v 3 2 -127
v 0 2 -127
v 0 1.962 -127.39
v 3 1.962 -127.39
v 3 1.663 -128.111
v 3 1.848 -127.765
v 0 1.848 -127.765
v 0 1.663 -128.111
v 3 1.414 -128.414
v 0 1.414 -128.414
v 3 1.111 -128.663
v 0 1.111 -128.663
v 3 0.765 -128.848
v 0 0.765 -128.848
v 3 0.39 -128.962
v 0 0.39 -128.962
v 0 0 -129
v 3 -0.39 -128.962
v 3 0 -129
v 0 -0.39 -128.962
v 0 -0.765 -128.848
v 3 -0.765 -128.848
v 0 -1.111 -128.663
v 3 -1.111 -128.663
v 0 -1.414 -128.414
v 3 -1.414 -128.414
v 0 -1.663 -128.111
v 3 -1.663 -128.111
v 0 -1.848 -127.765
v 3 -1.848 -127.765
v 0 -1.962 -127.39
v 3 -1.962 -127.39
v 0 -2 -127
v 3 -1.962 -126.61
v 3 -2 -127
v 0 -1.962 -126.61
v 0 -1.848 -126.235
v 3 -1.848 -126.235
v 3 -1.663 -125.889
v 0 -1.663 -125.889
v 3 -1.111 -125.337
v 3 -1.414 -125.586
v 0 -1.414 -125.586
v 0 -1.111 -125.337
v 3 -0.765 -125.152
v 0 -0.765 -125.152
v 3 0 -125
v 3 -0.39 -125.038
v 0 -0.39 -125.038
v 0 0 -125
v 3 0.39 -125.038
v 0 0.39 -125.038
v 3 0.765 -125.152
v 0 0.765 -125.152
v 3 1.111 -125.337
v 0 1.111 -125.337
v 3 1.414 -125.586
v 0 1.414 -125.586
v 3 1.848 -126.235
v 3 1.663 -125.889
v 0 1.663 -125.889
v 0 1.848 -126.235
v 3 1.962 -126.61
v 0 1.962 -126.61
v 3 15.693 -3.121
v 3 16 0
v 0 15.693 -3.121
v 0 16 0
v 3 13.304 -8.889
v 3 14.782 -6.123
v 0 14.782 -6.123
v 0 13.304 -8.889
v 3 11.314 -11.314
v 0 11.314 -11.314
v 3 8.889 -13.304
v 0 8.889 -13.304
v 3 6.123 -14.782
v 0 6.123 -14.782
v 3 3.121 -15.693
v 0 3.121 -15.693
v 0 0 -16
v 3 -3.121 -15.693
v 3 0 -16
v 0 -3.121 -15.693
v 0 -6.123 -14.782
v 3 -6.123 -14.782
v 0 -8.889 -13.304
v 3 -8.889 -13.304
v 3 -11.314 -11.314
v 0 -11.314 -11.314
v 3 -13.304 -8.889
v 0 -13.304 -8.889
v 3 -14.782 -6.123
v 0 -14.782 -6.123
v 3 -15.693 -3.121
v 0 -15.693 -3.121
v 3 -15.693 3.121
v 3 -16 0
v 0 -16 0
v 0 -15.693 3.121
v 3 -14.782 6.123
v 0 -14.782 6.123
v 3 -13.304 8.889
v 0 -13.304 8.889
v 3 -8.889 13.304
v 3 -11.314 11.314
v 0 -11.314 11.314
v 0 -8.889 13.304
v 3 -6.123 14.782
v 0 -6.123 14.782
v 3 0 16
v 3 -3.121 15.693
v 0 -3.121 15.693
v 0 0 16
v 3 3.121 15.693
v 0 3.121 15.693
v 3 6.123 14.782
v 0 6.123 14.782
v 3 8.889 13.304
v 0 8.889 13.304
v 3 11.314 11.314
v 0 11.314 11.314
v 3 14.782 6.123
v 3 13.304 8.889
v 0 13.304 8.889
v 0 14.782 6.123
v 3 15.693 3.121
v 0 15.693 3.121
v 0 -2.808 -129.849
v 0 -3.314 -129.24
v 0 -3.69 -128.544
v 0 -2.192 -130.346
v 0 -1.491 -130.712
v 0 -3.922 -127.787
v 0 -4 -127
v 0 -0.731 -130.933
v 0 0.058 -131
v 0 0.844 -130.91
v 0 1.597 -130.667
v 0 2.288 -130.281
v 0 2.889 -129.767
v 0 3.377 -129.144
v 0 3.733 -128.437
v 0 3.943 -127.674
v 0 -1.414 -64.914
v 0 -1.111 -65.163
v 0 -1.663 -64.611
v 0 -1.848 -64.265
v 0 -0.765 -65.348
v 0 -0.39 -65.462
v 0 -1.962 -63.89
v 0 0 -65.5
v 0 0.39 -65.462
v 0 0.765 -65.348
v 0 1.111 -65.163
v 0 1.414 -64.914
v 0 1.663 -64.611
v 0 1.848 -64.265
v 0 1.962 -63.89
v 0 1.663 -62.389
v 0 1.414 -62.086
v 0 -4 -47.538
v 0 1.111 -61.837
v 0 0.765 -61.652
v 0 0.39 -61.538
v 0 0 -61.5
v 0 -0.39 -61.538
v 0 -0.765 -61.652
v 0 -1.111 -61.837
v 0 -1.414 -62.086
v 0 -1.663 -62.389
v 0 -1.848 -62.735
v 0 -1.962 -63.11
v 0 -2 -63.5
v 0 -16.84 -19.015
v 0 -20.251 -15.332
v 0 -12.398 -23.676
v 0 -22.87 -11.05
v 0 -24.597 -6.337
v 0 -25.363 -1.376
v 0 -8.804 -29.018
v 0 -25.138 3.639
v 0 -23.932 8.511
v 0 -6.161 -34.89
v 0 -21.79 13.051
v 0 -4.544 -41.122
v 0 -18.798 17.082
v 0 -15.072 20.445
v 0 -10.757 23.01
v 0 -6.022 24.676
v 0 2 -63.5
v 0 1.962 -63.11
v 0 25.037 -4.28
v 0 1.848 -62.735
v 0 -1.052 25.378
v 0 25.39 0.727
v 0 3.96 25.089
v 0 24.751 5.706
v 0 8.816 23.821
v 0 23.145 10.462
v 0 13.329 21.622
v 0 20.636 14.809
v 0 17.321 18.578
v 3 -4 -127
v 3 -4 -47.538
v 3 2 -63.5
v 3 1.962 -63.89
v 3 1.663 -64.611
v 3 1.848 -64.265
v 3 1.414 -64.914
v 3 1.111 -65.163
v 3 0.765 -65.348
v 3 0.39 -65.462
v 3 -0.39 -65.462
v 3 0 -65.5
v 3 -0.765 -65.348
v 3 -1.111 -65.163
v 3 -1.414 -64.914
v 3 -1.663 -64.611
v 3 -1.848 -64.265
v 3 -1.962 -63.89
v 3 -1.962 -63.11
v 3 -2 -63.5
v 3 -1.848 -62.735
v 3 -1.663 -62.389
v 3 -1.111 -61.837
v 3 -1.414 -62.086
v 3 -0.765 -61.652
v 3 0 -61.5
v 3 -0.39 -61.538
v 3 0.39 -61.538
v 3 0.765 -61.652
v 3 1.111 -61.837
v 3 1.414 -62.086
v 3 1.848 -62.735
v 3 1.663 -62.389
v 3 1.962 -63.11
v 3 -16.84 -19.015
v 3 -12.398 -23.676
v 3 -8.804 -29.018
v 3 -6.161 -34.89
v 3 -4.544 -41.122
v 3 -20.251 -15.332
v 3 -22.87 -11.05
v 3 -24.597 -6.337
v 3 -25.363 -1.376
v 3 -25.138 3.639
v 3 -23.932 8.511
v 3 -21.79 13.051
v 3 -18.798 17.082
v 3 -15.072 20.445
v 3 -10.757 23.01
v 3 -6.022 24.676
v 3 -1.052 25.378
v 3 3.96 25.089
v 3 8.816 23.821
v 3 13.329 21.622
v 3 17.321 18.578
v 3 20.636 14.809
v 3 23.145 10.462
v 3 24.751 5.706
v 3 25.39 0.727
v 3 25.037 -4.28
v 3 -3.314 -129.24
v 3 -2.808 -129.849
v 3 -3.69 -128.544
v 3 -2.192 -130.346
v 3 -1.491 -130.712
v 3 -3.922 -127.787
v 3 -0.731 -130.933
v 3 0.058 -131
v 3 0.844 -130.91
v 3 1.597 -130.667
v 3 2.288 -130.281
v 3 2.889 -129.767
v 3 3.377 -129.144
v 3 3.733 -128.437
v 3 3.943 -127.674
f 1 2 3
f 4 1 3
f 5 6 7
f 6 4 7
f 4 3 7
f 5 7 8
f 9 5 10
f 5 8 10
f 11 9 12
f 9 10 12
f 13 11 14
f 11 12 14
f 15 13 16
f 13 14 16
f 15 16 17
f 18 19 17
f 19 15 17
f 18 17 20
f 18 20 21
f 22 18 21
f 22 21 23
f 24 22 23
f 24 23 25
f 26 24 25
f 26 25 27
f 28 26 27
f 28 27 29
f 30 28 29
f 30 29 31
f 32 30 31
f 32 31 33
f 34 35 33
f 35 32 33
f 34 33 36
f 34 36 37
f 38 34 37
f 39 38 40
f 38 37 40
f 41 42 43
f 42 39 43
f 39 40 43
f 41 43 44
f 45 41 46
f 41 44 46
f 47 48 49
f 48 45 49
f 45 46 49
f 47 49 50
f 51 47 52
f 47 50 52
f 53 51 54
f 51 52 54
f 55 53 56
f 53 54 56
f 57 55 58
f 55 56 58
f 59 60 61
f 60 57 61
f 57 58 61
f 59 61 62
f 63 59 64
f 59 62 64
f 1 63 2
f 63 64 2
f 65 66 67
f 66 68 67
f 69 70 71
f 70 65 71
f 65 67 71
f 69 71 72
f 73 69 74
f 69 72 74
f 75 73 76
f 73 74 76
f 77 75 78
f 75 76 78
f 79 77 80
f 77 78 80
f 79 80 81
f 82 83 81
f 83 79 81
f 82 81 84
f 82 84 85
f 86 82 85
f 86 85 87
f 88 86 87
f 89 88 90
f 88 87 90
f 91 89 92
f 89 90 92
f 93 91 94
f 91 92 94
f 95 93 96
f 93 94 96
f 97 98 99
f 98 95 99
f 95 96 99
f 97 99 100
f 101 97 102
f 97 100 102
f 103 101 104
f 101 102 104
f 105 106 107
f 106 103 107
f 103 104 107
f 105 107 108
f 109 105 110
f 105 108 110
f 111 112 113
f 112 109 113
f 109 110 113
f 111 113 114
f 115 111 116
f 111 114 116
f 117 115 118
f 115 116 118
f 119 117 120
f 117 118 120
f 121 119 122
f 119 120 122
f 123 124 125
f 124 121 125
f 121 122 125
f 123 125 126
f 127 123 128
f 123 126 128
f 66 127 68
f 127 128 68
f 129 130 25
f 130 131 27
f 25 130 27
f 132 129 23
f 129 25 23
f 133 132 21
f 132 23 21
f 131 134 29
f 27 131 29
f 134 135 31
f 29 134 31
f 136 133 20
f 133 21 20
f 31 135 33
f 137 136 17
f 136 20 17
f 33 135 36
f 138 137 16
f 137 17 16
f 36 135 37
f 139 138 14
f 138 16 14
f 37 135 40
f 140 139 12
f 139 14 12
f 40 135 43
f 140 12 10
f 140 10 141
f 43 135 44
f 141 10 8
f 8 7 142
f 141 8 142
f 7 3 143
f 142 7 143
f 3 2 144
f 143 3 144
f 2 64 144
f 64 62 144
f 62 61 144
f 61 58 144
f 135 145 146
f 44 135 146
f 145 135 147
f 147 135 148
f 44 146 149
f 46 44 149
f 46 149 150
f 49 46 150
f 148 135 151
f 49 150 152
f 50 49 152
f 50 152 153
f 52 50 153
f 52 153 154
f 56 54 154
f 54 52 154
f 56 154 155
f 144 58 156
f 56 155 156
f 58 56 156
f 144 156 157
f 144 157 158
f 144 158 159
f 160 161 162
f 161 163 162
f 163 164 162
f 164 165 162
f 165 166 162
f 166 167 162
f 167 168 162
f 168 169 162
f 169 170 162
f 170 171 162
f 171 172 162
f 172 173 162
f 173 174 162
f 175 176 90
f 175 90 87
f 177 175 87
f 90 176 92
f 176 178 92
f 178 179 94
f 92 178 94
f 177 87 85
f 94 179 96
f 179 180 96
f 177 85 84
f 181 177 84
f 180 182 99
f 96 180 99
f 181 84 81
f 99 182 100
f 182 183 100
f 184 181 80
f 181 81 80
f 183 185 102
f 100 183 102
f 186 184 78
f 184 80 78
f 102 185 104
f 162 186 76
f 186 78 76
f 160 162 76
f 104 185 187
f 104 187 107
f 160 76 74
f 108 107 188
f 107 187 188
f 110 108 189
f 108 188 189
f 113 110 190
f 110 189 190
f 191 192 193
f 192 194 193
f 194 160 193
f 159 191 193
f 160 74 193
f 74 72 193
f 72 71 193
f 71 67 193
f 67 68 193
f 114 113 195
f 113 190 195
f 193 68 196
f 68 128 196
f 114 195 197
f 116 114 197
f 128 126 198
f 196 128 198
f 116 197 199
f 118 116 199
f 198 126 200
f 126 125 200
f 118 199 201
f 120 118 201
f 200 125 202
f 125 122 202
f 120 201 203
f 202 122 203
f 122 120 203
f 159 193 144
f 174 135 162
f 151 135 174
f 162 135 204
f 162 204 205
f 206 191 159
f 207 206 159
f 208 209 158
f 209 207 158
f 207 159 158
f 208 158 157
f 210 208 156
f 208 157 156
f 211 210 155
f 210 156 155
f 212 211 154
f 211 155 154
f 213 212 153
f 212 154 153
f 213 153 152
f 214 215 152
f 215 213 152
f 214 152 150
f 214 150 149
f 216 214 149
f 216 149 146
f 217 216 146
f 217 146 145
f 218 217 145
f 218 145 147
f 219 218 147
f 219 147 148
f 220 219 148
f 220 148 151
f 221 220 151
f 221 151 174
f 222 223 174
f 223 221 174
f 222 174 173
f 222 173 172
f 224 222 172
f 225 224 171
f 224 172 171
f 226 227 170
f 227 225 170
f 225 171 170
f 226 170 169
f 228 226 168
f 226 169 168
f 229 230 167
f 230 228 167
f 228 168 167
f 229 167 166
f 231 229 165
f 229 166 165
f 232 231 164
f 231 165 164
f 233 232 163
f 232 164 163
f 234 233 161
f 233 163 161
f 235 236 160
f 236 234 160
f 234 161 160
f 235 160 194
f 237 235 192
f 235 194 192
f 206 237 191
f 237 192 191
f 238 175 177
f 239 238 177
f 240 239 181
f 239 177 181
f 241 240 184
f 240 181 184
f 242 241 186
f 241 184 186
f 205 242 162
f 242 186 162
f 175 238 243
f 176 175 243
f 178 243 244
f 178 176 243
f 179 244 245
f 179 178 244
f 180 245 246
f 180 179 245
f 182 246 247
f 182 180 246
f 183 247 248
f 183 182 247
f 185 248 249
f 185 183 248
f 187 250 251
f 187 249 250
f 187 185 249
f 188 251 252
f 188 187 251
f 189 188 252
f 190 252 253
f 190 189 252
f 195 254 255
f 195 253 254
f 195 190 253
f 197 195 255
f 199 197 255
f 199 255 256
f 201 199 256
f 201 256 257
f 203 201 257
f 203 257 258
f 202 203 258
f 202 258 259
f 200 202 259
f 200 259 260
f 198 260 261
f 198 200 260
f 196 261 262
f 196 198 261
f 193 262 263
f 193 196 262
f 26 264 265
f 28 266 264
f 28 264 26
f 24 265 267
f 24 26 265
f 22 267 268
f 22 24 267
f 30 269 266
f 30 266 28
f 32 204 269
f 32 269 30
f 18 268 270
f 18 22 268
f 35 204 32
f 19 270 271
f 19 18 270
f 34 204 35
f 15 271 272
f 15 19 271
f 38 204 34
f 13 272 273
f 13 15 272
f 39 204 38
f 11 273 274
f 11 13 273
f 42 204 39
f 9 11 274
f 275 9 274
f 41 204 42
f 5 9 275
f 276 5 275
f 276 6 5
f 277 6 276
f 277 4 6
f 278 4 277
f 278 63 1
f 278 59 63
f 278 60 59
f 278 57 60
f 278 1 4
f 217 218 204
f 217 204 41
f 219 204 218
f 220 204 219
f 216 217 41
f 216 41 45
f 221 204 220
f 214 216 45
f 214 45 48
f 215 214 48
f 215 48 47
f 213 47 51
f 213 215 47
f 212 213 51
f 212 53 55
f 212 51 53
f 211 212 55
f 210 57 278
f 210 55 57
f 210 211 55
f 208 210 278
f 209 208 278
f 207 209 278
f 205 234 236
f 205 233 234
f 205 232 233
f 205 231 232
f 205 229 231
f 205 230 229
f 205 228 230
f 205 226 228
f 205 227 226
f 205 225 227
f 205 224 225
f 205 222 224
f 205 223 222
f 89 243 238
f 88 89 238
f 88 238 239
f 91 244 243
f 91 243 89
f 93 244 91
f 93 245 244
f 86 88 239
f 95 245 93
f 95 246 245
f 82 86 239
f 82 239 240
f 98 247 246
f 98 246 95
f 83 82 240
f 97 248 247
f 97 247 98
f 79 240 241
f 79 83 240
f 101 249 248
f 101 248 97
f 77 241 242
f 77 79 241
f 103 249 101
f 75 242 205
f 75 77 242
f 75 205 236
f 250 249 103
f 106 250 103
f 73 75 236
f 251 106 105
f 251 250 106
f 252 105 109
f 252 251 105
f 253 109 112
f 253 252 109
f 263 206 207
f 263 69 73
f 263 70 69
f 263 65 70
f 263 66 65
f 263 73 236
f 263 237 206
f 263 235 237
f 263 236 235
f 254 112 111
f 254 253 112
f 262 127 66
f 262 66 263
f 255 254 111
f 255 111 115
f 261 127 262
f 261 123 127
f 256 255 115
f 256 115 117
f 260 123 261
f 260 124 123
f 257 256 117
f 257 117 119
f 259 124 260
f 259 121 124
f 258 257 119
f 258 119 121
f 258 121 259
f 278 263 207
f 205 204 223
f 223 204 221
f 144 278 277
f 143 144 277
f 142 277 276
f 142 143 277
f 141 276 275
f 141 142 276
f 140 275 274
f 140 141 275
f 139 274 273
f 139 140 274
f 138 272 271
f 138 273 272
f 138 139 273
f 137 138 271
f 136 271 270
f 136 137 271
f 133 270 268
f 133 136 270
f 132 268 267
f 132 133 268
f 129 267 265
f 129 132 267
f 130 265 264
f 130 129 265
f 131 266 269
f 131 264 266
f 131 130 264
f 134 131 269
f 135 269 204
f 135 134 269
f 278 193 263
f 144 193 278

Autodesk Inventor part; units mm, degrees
ref_plane "YZ Plane" through (0, 0, 0) normal (1, 0, 0) x (0, 1, 0)
ref_plane "XZ Plane" through (0, 0, 0) normal (0, 1, 0) x (-1, 0, 0)
ref_plane "XY Plane" through (0, 0, 0) normal (0, 0, 1) x (1, 0, 0)
sketch "Sketch1" plane through (0, 0, 0) normal (1, 0, 0) x (0, 1, 0)
  line L0 (25.0368, -4.28) -> (3.9428, -127.674)
  arc A0 (-4, -127) -> (3.9428, -127.674) centre (0, -127) ccw
  arc A1 (25.0368, -4.28) -> (-16.84, -19.0151) centre (0, 0) ccw
  line L1 (0, 0) -> (0, -127) construction
  circle A2 centre (0, 0) radius 16
  circle A3 centre (0, -127) radius 2
  circle A4 centre (0, -63.5) radius 2
  line L2 (-4, -127) -> (-4, -47.5378)
  arc A5 (-4, -47.5378) -> (-16.84, -19.0151) centre (-42.1, -47.5378) ccw
  dimension "d0" = 32
  dimension "d1" = 127
  dimension "d2" = 4
  dimension "d3" = 25.4
  dimension "d4" = 4
  dimension "d7" = 63.5
  dimension "d14" = 38.1
extrude "Extrusion1" add sketch "Sketch1" along normal blind 3
properties part number "linkPanel" material "CFRP"
